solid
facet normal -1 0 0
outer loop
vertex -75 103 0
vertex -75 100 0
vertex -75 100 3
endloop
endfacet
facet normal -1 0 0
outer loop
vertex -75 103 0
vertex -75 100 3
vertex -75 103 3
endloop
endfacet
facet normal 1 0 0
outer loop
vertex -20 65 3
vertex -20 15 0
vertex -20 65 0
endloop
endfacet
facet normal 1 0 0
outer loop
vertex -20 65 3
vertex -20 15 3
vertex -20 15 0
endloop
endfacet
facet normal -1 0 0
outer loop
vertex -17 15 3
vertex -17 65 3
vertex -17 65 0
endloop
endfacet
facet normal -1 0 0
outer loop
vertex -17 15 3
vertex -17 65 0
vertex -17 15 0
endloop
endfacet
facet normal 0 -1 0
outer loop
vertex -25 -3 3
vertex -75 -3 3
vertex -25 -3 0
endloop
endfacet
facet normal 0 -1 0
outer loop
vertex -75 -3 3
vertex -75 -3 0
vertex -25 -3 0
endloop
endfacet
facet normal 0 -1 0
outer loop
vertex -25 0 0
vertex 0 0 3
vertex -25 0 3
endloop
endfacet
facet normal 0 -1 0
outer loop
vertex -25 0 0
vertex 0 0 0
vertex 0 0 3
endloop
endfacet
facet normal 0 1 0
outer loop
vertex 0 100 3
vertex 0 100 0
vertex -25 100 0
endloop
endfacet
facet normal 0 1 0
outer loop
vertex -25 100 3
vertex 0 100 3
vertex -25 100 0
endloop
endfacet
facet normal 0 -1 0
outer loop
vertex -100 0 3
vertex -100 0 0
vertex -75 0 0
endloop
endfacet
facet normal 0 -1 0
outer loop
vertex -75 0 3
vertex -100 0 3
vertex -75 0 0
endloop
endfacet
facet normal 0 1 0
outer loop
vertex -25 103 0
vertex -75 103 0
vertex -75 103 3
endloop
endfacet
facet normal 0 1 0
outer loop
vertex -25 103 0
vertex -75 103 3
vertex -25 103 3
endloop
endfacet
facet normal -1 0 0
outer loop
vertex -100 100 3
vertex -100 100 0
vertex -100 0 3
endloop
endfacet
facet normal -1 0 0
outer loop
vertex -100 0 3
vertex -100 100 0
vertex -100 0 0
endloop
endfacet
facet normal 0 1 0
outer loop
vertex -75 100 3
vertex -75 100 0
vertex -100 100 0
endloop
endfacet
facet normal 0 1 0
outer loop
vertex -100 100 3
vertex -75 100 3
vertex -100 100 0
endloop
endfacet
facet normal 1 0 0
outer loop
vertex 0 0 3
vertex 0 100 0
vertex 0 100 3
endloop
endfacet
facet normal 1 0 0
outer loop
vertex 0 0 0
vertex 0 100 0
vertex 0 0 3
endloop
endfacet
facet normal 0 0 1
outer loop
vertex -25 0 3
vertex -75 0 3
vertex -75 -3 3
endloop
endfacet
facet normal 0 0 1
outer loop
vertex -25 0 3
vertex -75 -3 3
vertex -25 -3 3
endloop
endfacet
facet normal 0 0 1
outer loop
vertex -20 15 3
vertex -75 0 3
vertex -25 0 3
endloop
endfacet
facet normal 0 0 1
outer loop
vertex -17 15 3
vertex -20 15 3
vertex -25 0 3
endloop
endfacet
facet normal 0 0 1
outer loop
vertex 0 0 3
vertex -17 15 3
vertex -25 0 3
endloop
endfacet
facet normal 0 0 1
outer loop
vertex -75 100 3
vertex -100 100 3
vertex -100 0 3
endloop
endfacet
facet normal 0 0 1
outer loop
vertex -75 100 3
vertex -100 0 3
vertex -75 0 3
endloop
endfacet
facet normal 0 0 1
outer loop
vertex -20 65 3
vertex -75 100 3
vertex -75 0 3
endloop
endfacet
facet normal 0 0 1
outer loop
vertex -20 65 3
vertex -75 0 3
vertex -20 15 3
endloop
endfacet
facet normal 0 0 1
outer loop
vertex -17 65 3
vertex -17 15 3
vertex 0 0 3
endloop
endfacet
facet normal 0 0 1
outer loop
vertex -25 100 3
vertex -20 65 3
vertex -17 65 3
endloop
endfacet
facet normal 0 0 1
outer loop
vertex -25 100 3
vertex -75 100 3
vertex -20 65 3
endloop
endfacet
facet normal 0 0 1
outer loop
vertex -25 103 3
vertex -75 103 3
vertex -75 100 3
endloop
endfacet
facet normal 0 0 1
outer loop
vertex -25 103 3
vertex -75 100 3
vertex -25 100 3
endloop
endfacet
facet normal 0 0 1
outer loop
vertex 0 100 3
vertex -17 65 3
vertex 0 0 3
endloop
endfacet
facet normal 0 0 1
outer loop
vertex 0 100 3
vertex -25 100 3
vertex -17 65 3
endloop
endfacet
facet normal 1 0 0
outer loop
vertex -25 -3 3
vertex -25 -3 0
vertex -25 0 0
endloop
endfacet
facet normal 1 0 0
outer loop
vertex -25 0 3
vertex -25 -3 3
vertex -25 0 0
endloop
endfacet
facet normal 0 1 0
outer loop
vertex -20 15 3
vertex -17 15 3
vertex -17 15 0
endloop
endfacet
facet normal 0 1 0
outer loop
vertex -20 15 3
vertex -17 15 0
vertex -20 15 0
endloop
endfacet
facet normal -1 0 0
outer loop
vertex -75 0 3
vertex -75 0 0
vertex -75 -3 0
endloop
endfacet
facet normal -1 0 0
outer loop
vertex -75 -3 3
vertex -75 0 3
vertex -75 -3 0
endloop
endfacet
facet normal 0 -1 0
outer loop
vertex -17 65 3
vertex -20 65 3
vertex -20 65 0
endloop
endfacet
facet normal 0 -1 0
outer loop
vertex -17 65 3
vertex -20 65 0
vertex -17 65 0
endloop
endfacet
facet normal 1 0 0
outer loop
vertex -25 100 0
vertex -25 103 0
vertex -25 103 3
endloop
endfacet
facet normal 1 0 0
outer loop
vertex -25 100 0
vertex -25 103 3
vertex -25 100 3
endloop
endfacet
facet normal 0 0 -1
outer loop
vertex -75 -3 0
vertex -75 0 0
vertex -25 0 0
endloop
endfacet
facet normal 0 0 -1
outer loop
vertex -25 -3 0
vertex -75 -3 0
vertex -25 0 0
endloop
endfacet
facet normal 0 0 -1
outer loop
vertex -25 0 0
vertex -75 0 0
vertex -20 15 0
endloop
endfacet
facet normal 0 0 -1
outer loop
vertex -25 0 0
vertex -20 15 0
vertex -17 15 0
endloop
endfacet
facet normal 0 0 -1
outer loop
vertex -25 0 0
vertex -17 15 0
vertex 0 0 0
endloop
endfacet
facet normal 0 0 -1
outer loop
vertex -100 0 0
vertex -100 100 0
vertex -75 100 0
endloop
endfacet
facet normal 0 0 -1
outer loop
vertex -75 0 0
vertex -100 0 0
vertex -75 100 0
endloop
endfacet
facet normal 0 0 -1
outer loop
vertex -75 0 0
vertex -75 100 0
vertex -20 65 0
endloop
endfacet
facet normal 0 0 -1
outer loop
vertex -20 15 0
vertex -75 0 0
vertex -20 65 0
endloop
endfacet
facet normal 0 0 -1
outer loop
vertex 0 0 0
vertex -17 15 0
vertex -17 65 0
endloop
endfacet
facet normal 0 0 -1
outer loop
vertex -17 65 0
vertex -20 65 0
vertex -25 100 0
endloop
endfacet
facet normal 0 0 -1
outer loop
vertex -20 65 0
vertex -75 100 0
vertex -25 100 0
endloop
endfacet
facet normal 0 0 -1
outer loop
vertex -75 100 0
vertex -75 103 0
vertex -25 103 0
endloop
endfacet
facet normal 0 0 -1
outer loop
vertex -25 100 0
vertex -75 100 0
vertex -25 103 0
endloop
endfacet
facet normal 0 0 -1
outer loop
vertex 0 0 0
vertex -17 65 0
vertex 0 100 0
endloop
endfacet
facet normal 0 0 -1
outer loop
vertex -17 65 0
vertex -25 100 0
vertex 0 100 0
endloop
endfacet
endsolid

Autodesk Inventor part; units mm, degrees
ref_plane "YZ Plane" through (0, 0, 0) normal (1, 0, 0) x (0, 1, 0)
ref_plane "XZ Plane" through (0, 0, 0) normal (0, 1, 0) x (-1, 0, 0)
ref_plane "XY Plane" through (0, 0, 0) normal (0, 0, 1) x (1, 0, 0)
sketch "Boceto1" plane through (0, 0, 0) normal (0, 0, 1) x (1, 0, 0)
  line L0 (0, 100) -> (0, 0)
  line L1 (-75, 0) -> (-75, -3)
  line L2 (-75, -3) -> (-25, -3)
  line L3 (-25, -3) -> (-25, 0)
  line L4 (0, 0) -> (-25, 0)
  line L5 (-100, 0) -> (-75, 0)
  line L6 (-75, 100) -> (-75, 103)
  line L7 (-75, 103) -> (-25, 103)
  line L8 (-25, 103) -> (-25, 100)
  line L9 (0, 100) -> (-25, 100)
  line L10 (-75, 100) -> (-100, 100)
  line L11 (-100, 100) -> (-100, 0)
  dimension "d1" = 100
  dimension "d4" = 50
  dimension "d5" = 25
  dimension "d10" = 3
  dimension "d13" = 50
  dimension "d14" = 3
  dimension "d37" = 100
extrude "Extrusión2" add sketch "Boceto1" along normal blind 3
sketch "Boceto2" plane through (0, 0, 3) normal (0, 0, 1) x (1, 0, 0)
  line L0 (-20, 65) -> (-17, 65)
  line L1 (-17, 65) -> (-17, 15)
  line L2 (-17, 15) -> (-20, 15)
  line L3 (-20, 15) -> (-20, 65)
  line L4 (-25, 0) -> (0, 0) projected
  line L5 (-100, 100) -> (-100, 0) projected
  dimension "d38" = 3
  dimension "d39" = 50
  dimension "d40" = 15
  dimension "d41" = 80
extrude "Extrusión3" cut sketch "Boceto2" against normal blind 3
properties part number "Control lateral"
